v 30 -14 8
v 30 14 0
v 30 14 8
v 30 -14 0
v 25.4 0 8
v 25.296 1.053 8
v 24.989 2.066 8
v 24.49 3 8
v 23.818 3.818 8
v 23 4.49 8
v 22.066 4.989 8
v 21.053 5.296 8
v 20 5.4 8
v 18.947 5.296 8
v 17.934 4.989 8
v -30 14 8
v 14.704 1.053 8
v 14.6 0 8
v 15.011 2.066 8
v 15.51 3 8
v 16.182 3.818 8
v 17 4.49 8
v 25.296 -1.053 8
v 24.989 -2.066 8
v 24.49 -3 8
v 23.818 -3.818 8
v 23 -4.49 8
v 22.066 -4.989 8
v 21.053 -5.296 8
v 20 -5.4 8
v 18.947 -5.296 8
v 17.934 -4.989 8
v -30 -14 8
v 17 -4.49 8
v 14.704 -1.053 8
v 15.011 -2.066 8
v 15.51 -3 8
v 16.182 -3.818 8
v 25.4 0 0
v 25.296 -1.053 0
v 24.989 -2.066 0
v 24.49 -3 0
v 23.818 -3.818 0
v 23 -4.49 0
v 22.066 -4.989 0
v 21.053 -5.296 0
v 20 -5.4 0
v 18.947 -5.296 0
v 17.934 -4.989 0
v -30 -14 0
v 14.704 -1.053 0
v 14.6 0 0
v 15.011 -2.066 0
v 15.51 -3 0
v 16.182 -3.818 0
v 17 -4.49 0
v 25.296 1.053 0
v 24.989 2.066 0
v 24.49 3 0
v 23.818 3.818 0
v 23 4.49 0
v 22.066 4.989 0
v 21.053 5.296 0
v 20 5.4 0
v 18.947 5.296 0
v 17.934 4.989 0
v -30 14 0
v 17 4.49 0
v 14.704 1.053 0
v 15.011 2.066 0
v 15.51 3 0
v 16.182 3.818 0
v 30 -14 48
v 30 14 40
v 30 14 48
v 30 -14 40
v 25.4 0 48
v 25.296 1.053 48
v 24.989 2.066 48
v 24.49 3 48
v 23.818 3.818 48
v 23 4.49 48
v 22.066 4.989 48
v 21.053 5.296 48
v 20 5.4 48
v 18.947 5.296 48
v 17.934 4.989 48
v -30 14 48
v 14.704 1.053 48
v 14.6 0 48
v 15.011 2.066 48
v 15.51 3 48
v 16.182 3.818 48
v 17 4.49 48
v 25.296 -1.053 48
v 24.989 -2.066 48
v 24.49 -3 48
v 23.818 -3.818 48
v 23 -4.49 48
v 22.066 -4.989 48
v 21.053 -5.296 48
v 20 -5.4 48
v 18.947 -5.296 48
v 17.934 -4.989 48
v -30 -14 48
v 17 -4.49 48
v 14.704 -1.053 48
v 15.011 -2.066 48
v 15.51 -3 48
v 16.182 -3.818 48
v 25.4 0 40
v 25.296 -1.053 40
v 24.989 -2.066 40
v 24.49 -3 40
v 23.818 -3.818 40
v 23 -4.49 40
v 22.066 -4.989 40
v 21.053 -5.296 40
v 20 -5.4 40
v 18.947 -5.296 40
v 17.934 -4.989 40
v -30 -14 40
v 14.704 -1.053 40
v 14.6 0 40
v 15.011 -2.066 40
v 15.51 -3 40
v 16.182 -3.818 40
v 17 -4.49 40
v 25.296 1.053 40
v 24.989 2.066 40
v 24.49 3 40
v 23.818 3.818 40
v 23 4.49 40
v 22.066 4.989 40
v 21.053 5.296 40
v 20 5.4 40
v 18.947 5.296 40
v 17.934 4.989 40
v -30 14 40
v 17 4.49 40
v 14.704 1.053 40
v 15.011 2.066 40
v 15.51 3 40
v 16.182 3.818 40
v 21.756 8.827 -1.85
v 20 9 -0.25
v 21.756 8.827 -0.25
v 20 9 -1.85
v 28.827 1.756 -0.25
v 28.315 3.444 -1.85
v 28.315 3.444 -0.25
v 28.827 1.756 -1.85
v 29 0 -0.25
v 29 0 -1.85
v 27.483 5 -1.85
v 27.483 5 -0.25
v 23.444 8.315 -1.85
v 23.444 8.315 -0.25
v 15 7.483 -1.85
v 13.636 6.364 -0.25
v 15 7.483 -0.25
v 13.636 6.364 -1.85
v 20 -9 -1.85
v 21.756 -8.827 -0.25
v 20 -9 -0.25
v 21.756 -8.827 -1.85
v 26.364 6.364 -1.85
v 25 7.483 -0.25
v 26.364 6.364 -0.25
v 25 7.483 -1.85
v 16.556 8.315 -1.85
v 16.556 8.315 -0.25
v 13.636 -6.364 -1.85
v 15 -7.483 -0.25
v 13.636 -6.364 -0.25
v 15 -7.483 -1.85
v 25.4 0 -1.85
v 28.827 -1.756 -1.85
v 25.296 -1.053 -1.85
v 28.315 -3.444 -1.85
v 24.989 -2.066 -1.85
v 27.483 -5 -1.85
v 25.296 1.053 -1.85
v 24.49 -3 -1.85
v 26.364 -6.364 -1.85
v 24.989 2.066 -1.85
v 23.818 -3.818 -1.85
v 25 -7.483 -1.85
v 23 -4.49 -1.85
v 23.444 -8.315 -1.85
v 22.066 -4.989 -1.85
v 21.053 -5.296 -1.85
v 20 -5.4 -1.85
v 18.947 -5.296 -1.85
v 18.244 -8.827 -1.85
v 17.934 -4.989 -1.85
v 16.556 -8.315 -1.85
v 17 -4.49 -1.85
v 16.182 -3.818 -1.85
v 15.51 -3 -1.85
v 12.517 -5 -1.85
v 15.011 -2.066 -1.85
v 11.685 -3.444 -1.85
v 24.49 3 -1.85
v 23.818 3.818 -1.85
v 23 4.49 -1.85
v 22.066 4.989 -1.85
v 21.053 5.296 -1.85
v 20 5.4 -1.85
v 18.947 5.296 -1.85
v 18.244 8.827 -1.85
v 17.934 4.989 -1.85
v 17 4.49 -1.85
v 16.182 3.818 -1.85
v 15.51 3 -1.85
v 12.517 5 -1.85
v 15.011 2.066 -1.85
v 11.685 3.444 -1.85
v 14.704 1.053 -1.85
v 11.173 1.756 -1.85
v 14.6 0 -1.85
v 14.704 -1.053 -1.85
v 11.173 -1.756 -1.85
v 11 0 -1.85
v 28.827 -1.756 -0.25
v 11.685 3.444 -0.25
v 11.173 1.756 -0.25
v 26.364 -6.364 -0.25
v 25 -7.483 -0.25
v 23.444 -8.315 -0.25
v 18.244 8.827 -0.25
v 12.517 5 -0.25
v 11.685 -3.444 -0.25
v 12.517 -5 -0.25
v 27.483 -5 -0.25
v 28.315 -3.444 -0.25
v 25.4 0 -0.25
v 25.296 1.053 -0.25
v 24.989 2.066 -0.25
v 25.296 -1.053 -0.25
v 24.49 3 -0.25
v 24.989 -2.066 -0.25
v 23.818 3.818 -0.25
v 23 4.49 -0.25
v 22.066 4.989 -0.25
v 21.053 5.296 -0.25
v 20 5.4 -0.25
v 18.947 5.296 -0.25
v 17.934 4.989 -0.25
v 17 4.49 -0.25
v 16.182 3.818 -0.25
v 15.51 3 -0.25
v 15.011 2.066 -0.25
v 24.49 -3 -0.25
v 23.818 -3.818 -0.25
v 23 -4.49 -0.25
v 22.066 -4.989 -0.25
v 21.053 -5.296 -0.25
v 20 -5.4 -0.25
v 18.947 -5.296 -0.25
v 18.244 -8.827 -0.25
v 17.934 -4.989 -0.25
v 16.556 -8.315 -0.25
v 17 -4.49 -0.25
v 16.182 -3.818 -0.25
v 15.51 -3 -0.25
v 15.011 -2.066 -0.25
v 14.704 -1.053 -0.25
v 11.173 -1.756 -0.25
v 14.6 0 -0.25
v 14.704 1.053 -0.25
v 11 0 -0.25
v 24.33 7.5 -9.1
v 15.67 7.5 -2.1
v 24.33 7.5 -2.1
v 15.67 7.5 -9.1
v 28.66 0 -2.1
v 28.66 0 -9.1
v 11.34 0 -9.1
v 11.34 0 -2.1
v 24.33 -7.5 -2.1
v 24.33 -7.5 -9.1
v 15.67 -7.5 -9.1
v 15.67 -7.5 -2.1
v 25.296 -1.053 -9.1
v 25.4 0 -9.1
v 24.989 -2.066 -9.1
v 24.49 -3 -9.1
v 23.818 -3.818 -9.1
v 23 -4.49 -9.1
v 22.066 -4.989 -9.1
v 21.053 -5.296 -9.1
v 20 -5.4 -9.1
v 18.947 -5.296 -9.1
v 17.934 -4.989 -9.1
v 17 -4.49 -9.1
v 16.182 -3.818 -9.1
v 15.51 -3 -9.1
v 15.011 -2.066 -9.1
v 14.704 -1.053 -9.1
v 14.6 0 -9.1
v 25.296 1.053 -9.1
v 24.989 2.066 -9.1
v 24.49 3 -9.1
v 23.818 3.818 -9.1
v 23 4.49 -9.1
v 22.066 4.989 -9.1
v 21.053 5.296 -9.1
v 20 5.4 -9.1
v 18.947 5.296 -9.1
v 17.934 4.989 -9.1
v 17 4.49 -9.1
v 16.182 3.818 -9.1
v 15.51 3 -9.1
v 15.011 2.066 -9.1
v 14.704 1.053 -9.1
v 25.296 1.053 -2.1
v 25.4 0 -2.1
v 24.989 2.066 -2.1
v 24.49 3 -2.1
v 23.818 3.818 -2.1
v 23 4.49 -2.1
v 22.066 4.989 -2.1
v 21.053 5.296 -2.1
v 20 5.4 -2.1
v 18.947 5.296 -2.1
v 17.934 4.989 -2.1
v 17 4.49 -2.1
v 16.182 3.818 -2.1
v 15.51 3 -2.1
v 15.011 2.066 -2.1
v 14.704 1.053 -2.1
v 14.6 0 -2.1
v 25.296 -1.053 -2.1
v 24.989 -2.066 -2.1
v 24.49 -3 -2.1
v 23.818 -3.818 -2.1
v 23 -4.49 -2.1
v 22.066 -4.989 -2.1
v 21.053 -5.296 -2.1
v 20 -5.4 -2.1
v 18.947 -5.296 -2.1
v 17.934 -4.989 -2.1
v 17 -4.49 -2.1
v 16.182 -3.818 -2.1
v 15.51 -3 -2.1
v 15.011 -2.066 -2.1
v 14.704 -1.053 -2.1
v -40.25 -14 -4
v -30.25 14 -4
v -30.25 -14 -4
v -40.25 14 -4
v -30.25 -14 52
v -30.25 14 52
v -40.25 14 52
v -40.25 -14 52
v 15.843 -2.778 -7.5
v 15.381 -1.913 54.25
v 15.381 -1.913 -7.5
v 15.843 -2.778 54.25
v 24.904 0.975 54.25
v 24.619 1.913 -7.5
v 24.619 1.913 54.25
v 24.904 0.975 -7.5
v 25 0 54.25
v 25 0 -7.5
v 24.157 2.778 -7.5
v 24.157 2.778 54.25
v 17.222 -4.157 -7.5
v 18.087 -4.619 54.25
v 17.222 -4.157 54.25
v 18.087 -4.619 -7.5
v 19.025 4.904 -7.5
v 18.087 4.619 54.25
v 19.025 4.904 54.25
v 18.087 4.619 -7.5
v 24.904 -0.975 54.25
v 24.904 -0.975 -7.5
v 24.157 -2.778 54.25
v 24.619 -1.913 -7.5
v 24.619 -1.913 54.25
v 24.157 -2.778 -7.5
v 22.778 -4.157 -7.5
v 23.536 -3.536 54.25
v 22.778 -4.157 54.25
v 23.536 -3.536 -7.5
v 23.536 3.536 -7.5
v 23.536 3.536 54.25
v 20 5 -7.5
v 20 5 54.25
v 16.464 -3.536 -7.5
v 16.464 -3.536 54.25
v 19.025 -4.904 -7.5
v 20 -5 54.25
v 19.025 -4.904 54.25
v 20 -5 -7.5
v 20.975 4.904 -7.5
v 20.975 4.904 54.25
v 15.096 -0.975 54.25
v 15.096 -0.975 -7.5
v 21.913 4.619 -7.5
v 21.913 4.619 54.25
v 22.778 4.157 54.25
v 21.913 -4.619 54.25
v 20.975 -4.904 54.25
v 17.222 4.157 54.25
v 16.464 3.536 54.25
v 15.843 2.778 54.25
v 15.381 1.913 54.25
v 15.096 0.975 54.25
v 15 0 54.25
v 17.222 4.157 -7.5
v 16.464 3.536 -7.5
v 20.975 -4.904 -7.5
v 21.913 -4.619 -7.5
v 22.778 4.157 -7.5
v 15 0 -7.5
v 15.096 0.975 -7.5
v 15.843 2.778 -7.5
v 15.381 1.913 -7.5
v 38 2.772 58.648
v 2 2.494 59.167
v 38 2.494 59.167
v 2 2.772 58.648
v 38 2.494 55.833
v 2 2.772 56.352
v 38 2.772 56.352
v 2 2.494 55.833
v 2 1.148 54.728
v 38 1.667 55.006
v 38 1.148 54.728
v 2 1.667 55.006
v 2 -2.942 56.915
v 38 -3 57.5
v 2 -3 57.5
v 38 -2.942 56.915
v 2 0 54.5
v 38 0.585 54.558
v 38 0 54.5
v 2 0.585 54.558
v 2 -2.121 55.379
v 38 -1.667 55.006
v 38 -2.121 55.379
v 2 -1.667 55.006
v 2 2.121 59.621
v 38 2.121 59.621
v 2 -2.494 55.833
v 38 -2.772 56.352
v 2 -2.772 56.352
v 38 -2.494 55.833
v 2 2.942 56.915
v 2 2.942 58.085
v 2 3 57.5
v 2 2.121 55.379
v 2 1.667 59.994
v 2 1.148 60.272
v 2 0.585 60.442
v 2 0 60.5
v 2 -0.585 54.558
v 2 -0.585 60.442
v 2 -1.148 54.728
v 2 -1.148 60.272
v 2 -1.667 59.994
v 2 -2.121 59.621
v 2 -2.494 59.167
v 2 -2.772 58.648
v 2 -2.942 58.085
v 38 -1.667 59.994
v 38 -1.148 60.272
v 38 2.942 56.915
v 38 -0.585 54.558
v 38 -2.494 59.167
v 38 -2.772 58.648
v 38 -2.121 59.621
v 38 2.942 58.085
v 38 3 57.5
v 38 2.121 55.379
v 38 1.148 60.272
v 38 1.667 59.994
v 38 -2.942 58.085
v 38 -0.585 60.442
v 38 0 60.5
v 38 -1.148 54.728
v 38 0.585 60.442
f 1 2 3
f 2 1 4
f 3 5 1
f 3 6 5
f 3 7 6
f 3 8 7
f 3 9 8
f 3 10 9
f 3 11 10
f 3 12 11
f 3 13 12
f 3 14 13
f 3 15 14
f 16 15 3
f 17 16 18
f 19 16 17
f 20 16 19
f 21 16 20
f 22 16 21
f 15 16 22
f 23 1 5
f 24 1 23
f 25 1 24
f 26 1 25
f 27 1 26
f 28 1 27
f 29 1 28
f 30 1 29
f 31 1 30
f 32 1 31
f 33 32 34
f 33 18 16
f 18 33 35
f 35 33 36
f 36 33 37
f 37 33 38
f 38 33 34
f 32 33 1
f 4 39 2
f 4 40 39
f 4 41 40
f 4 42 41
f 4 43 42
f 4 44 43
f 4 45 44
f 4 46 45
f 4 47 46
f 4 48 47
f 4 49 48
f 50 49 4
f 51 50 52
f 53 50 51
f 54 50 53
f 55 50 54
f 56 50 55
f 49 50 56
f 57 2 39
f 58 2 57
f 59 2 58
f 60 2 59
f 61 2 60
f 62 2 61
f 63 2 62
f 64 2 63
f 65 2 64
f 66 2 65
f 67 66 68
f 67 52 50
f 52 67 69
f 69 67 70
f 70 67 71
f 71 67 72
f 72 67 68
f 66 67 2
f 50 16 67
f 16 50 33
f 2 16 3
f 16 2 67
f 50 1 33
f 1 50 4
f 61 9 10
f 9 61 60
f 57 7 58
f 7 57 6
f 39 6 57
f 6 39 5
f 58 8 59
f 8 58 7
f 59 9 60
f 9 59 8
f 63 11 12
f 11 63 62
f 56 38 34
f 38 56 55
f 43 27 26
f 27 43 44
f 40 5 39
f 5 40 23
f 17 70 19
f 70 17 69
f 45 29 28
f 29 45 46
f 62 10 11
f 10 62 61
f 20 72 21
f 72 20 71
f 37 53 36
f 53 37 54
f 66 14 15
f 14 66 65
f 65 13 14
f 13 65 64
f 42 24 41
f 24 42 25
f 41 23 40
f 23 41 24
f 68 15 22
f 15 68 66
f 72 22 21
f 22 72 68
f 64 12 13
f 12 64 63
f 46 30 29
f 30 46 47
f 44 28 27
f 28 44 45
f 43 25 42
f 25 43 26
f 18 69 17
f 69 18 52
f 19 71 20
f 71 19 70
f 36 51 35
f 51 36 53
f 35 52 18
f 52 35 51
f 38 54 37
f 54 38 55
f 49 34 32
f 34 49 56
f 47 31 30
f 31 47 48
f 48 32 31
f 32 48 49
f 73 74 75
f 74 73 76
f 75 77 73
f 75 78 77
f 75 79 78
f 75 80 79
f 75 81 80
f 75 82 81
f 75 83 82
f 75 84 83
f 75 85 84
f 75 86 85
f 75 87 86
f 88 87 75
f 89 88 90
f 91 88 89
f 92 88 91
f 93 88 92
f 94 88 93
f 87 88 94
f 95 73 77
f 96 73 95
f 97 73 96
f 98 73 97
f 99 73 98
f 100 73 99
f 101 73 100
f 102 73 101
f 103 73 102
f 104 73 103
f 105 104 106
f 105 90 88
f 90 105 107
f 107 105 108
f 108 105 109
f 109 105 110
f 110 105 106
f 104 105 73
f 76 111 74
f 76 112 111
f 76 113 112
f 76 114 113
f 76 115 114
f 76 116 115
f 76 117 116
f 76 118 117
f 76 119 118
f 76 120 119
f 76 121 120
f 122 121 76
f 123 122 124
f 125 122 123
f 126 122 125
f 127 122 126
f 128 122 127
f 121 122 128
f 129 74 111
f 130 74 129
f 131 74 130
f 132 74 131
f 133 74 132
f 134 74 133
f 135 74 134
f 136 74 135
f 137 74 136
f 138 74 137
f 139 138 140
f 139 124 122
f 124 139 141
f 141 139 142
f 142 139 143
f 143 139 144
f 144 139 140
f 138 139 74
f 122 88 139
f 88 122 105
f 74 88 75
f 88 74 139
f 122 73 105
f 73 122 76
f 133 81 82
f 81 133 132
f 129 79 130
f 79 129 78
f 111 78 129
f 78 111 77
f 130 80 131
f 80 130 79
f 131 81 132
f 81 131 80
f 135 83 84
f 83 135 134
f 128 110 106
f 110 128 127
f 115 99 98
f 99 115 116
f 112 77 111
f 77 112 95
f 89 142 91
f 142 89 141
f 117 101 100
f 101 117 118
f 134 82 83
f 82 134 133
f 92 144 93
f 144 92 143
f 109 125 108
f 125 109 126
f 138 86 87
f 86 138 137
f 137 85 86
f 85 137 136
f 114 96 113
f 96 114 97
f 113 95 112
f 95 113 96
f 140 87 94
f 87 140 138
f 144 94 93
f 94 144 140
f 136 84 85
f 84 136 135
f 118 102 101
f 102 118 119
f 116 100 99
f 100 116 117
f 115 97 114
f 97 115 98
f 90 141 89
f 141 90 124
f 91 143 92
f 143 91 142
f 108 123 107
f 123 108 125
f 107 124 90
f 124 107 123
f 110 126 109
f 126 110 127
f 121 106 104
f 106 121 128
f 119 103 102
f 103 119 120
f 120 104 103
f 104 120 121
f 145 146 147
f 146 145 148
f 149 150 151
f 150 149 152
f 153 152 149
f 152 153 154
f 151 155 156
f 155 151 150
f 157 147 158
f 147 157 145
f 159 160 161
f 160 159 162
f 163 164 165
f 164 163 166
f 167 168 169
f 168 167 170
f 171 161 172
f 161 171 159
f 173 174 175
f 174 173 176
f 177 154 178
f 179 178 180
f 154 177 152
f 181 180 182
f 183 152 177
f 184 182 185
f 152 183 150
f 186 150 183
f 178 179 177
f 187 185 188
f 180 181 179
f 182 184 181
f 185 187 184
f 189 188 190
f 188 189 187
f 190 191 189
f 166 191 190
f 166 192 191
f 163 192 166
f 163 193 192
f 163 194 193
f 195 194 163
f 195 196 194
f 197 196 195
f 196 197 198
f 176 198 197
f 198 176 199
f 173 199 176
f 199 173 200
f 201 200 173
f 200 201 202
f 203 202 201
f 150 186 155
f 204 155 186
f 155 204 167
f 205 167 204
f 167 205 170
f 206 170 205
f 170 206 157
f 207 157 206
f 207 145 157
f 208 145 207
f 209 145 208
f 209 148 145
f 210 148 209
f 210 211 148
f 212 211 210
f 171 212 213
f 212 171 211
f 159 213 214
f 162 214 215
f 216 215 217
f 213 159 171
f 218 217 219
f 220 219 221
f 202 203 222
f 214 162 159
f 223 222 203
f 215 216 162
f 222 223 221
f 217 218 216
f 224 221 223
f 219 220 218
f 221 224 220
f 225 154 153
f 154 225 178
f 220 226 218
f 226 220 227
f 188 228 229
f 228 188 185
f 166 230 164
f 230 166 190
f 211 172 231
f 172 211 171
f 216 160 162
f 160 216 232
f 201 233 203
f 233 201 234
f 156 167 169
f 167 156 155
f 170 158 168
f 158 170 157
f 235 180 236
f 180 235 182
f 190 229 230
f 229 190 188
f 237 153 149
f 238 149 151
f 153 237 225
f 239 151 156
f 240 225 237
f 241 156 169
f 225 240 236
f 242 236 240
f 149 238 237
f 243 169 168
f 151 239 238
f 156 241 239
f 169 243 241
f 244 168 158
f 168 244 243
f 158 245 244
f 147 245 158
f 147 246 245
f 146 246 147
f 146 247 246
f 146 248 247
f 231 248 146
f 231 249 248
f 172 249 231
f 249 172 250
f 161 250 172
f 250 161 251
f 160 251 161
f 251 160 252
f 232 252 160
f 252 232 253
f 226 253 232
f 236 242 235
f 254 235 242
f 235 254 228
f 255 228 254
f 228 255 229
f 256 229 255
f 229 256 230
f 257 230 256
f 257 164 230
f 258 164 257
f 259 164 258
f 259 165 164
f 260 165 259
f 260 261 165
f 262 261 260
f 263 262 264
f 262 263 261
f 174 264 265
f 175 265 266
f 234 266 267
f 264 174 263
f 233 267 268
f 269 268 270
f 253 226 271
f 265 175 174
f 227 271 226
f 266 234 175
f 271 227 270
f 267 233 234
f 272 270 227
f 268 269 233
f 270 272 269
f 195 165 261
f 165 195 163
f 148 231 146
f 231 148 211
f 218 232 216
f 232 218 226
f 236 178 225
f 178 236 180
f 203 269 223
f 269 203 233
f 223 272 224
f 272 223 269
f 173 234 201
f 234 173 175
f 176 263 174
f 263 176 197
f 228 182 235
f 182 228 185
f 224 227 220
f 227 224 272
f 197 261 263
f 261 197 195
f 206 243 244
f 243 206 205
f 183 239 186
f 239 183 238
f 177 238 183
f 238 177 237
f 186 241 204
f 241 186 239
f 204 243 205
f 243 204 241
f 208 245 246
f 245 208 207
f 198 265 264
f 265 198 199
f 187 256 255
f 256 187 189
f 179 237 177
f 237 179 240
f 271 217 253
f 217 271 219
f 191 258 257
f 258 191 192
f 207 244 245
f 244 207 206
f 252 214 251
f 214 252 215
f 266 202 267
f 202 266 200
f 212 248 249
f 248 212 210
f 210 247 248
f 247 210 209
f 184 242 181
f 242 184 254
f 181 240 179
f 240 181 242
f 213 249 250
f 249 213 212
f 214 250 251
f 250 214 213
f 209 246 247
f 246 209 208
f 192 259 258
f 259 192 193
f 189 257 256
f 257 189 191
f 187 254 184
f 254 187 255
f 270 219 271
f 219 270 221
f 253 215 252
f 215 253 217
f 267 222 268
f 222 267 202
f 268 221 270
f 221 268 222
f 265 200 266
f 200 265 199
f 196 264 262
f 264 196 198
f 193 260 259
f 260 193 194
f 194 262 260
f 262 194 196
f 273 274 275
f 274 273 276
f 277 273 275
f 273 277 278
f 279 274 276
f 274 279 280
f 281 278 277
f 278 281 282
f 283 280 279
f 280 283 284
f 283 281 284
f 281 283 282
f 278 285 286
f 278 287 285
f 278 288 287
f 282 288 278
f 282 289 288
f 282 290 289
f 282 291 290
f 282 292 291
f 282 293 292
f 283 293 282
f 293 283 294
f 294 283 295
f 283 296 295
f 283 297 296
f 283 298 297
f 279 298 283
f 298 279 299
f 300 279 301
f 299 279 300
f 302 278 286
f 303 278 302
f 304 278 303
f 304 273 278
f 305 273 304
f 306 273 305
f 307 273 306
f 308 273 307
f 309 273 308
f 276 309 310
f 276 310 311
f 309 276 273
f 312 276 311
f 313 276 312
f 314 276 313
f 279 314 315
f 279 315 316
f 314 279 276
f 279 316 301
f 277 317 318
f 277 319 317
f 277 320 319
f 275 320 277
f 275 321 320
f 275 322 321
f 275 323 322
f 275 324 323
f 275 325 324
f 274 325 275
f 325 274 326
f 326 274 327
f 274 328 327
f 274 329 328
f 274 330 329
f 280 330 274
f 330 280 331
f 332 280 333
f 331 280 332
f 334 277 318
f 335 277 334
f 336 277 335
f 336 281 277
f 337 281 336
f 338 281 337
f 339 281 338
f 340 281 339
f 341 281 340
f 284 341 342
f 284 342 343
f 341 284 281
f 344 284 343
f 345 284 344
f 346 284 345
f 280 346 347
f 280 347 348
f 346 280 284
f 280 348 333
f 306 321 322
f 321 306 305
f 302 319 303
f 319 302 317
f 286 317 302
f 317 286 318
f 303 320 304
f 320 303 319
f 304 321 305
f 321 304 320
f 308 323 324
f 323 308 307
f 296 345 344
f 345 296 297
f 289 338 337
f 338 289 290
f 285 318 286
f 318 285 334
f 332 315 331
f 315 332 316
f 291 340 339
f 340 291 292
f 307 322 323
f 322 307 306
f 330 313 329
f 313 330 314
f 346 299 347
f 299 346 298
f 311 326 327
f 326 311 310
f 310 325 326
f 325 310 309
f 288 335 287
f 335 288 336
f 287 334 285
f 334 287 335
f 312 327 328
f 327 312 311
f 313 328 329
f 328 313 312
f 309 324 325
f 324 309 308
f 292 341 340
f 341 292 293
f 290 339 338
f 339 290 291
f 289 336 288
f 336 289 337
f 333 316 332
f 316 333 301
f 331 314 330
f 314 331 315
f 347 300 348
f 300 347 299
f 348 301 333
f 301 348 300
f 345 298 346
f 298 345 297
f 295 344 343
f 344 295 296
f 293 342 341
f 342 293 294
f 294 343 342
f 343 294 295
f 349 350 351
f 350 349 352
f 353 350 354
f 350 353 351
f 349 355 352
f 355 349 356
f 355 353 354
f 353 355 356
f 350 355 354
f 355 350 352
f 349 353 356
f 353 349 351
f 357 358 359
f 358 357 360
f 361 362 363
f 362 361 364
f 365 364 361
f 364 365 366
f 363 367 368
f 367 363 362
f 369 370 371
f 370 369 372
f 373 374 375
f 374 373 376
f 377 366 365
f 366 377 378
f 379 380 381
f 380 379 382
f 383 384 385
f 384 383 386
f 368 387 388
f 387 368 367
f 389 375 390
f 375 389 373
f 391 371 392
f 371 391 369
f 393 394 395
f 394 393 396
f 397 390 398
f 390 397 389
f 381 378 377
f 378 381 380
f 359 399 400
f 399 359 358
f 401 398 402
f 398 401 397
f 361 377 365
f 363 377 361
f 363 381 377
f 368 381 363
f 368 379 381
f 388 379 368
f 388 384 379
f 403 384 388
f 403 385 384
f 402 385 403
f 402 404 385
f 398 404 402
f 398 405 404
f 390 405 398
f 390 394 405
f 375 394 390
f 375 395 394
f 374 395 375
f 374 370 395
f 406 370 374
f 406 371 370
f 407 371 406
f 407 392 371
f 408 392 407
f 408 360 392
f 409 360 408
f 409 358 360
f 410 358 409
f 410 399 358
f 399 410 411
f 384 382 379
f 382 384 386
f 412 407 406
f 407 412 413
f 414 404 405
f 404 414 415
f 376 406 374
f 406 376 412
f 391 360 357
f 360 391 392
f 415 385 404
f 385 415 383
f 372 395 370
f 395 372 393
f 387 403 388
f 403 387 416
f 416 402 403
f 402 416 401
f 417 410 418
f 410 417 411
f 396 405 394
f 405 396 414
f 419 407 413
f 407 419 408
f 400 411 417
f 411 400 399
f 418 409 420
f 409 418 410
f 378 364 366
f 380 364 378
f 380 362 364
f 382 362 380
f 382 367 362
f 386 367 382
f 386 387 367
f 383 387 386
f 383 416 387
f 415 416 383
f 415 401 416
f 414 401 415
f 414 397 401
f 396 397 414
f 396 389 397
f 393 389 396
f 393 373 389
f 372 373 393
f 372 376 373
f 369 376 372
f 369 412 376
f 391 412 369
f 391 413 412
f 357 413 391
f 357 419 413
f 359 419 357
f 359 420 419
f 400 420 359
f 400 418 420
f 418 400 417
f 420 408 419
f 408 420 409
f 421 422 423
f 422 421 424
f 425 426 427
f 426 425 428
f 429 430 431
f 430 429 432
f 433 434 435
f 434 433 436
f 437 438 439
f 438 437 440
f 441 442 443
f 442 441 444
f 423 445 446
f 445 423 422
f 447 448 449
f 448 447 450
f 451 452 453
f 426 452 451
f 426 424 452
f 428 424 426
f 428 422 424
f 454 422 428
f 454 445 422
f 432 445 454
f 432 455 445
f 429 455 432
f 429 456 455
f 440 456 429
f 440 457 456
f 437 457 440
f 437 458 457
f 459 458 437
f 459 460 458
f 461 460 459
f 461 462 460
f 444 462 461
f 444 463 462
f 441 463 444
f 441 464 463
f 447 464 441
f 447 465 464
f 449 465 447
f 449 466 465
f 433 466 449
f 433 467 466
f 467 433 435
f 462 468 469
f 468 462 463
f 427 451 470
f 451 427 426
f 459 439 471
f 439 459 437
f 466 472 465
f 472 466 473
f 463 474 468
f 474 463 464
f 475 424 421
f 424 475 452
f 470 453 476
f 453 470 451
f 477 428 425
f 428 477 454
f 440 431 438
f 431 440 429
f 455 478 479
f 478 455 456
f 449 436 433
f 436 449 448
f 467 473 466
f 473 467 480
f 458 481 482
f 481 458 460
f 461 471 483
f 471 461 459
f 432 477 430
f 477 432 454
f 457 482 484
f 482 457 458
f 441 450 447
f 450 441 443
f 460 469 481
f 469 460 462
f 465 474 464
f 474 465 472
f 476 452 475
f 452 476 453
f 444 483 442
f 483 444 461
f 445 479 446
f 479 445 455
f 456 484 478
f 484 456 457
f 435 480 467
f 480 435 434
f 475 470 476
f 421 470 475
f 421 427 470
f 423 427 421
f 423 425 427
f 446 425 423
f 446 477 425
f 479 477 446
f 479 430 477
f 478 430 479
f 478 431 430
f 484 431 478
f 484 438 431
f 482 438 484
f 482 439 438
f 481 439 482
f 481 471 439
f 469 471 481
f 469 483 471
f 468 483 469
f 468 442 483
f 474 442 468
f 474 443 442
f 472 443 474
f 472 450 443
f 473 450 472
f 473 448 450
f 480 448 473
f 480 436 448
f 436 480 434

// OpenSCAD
$fn = 32;

// ------------------------------------------------------------------------
// C clamp: throat 40 mm, screw d10
// Every part is its own module, assembly() places every instance.
// ------------------------------------------------------------------------

// --- part 1 ---
module clamp_arm() {
  difference() {
    translate([-30, -14, 0]) cube([60, 28, 8]);
    translate([20, 0, -1]) cylinder(h = 10, d = 10.8);
  }
}

// --- part 2 ---
module clamp_spine() {
  difference() {
    translate([-28, -14, 0]) cube([56, 28, 10]);
  }
}

// --- part 3 ---
module clamp_screw() {
  translate([0, 0, -30.875]) cylinder(h = 61.75, d = 10);
}

// --- part 4 ---
module clamp_washer() {
  difference() {
      translate([0, 0, 0]) cylinder(h = 1.6, d = 18);
      translate([0, 0, -1]) cylinder(h = 3.6, d = 10.8);
    }
}

// --- part 5 ---
module clamp_nut() {
  difference() {
    linear_extrude(height = 7) polygon(points = [[8.66, 0], [4.33, 7.5], [-4.33, 7.5], [-8.66, 0], [-4.33, -7.5], [4.33, -7.5]]);
    translate([0, 0, -1]) cylinder(h = 9, d = 10.8);
  }
}

// --- part 6 ---
module tommy_bar() {
  translate([0, 0, -18]) cylinder(h = 36, d = 6);
}

// --- assembly ---
module assembly() {
  color([0.80, 0.24, 0.20]) translate([0, 0, 0]) rotate([0, 0, 0]) clamp_arm();
  color([0.20, 0.45, 0.75]) translate([0, 0, 40]) rotate([0, 0, 0]) clamp_arm();
  color([0.25, 0.62, 0.32]) translate([-40.25, 0, 24]) rotate([0, 90, 0]) clamp_spine();
  color([0.92, 0.70, 0.18]) translate([20, 0, 23.375]) rotate([0, 0, 0]) clamp_screw();
  color([0.58, 0.35, 0.70]) translate([20, 0, -1.85]) rotate([0, 0, 0]) clamp_washer();
  color([0.16, 0.66, 0.66]) translate([20, 0, -9.1]) rotate([0, 0, 0]) clamp_nut();
  color([0.85, 0.48, 0.18]) translate([20, 0, 57.5]) rotate([0, 90, 0]) tommy_bar();
}

assembly();
